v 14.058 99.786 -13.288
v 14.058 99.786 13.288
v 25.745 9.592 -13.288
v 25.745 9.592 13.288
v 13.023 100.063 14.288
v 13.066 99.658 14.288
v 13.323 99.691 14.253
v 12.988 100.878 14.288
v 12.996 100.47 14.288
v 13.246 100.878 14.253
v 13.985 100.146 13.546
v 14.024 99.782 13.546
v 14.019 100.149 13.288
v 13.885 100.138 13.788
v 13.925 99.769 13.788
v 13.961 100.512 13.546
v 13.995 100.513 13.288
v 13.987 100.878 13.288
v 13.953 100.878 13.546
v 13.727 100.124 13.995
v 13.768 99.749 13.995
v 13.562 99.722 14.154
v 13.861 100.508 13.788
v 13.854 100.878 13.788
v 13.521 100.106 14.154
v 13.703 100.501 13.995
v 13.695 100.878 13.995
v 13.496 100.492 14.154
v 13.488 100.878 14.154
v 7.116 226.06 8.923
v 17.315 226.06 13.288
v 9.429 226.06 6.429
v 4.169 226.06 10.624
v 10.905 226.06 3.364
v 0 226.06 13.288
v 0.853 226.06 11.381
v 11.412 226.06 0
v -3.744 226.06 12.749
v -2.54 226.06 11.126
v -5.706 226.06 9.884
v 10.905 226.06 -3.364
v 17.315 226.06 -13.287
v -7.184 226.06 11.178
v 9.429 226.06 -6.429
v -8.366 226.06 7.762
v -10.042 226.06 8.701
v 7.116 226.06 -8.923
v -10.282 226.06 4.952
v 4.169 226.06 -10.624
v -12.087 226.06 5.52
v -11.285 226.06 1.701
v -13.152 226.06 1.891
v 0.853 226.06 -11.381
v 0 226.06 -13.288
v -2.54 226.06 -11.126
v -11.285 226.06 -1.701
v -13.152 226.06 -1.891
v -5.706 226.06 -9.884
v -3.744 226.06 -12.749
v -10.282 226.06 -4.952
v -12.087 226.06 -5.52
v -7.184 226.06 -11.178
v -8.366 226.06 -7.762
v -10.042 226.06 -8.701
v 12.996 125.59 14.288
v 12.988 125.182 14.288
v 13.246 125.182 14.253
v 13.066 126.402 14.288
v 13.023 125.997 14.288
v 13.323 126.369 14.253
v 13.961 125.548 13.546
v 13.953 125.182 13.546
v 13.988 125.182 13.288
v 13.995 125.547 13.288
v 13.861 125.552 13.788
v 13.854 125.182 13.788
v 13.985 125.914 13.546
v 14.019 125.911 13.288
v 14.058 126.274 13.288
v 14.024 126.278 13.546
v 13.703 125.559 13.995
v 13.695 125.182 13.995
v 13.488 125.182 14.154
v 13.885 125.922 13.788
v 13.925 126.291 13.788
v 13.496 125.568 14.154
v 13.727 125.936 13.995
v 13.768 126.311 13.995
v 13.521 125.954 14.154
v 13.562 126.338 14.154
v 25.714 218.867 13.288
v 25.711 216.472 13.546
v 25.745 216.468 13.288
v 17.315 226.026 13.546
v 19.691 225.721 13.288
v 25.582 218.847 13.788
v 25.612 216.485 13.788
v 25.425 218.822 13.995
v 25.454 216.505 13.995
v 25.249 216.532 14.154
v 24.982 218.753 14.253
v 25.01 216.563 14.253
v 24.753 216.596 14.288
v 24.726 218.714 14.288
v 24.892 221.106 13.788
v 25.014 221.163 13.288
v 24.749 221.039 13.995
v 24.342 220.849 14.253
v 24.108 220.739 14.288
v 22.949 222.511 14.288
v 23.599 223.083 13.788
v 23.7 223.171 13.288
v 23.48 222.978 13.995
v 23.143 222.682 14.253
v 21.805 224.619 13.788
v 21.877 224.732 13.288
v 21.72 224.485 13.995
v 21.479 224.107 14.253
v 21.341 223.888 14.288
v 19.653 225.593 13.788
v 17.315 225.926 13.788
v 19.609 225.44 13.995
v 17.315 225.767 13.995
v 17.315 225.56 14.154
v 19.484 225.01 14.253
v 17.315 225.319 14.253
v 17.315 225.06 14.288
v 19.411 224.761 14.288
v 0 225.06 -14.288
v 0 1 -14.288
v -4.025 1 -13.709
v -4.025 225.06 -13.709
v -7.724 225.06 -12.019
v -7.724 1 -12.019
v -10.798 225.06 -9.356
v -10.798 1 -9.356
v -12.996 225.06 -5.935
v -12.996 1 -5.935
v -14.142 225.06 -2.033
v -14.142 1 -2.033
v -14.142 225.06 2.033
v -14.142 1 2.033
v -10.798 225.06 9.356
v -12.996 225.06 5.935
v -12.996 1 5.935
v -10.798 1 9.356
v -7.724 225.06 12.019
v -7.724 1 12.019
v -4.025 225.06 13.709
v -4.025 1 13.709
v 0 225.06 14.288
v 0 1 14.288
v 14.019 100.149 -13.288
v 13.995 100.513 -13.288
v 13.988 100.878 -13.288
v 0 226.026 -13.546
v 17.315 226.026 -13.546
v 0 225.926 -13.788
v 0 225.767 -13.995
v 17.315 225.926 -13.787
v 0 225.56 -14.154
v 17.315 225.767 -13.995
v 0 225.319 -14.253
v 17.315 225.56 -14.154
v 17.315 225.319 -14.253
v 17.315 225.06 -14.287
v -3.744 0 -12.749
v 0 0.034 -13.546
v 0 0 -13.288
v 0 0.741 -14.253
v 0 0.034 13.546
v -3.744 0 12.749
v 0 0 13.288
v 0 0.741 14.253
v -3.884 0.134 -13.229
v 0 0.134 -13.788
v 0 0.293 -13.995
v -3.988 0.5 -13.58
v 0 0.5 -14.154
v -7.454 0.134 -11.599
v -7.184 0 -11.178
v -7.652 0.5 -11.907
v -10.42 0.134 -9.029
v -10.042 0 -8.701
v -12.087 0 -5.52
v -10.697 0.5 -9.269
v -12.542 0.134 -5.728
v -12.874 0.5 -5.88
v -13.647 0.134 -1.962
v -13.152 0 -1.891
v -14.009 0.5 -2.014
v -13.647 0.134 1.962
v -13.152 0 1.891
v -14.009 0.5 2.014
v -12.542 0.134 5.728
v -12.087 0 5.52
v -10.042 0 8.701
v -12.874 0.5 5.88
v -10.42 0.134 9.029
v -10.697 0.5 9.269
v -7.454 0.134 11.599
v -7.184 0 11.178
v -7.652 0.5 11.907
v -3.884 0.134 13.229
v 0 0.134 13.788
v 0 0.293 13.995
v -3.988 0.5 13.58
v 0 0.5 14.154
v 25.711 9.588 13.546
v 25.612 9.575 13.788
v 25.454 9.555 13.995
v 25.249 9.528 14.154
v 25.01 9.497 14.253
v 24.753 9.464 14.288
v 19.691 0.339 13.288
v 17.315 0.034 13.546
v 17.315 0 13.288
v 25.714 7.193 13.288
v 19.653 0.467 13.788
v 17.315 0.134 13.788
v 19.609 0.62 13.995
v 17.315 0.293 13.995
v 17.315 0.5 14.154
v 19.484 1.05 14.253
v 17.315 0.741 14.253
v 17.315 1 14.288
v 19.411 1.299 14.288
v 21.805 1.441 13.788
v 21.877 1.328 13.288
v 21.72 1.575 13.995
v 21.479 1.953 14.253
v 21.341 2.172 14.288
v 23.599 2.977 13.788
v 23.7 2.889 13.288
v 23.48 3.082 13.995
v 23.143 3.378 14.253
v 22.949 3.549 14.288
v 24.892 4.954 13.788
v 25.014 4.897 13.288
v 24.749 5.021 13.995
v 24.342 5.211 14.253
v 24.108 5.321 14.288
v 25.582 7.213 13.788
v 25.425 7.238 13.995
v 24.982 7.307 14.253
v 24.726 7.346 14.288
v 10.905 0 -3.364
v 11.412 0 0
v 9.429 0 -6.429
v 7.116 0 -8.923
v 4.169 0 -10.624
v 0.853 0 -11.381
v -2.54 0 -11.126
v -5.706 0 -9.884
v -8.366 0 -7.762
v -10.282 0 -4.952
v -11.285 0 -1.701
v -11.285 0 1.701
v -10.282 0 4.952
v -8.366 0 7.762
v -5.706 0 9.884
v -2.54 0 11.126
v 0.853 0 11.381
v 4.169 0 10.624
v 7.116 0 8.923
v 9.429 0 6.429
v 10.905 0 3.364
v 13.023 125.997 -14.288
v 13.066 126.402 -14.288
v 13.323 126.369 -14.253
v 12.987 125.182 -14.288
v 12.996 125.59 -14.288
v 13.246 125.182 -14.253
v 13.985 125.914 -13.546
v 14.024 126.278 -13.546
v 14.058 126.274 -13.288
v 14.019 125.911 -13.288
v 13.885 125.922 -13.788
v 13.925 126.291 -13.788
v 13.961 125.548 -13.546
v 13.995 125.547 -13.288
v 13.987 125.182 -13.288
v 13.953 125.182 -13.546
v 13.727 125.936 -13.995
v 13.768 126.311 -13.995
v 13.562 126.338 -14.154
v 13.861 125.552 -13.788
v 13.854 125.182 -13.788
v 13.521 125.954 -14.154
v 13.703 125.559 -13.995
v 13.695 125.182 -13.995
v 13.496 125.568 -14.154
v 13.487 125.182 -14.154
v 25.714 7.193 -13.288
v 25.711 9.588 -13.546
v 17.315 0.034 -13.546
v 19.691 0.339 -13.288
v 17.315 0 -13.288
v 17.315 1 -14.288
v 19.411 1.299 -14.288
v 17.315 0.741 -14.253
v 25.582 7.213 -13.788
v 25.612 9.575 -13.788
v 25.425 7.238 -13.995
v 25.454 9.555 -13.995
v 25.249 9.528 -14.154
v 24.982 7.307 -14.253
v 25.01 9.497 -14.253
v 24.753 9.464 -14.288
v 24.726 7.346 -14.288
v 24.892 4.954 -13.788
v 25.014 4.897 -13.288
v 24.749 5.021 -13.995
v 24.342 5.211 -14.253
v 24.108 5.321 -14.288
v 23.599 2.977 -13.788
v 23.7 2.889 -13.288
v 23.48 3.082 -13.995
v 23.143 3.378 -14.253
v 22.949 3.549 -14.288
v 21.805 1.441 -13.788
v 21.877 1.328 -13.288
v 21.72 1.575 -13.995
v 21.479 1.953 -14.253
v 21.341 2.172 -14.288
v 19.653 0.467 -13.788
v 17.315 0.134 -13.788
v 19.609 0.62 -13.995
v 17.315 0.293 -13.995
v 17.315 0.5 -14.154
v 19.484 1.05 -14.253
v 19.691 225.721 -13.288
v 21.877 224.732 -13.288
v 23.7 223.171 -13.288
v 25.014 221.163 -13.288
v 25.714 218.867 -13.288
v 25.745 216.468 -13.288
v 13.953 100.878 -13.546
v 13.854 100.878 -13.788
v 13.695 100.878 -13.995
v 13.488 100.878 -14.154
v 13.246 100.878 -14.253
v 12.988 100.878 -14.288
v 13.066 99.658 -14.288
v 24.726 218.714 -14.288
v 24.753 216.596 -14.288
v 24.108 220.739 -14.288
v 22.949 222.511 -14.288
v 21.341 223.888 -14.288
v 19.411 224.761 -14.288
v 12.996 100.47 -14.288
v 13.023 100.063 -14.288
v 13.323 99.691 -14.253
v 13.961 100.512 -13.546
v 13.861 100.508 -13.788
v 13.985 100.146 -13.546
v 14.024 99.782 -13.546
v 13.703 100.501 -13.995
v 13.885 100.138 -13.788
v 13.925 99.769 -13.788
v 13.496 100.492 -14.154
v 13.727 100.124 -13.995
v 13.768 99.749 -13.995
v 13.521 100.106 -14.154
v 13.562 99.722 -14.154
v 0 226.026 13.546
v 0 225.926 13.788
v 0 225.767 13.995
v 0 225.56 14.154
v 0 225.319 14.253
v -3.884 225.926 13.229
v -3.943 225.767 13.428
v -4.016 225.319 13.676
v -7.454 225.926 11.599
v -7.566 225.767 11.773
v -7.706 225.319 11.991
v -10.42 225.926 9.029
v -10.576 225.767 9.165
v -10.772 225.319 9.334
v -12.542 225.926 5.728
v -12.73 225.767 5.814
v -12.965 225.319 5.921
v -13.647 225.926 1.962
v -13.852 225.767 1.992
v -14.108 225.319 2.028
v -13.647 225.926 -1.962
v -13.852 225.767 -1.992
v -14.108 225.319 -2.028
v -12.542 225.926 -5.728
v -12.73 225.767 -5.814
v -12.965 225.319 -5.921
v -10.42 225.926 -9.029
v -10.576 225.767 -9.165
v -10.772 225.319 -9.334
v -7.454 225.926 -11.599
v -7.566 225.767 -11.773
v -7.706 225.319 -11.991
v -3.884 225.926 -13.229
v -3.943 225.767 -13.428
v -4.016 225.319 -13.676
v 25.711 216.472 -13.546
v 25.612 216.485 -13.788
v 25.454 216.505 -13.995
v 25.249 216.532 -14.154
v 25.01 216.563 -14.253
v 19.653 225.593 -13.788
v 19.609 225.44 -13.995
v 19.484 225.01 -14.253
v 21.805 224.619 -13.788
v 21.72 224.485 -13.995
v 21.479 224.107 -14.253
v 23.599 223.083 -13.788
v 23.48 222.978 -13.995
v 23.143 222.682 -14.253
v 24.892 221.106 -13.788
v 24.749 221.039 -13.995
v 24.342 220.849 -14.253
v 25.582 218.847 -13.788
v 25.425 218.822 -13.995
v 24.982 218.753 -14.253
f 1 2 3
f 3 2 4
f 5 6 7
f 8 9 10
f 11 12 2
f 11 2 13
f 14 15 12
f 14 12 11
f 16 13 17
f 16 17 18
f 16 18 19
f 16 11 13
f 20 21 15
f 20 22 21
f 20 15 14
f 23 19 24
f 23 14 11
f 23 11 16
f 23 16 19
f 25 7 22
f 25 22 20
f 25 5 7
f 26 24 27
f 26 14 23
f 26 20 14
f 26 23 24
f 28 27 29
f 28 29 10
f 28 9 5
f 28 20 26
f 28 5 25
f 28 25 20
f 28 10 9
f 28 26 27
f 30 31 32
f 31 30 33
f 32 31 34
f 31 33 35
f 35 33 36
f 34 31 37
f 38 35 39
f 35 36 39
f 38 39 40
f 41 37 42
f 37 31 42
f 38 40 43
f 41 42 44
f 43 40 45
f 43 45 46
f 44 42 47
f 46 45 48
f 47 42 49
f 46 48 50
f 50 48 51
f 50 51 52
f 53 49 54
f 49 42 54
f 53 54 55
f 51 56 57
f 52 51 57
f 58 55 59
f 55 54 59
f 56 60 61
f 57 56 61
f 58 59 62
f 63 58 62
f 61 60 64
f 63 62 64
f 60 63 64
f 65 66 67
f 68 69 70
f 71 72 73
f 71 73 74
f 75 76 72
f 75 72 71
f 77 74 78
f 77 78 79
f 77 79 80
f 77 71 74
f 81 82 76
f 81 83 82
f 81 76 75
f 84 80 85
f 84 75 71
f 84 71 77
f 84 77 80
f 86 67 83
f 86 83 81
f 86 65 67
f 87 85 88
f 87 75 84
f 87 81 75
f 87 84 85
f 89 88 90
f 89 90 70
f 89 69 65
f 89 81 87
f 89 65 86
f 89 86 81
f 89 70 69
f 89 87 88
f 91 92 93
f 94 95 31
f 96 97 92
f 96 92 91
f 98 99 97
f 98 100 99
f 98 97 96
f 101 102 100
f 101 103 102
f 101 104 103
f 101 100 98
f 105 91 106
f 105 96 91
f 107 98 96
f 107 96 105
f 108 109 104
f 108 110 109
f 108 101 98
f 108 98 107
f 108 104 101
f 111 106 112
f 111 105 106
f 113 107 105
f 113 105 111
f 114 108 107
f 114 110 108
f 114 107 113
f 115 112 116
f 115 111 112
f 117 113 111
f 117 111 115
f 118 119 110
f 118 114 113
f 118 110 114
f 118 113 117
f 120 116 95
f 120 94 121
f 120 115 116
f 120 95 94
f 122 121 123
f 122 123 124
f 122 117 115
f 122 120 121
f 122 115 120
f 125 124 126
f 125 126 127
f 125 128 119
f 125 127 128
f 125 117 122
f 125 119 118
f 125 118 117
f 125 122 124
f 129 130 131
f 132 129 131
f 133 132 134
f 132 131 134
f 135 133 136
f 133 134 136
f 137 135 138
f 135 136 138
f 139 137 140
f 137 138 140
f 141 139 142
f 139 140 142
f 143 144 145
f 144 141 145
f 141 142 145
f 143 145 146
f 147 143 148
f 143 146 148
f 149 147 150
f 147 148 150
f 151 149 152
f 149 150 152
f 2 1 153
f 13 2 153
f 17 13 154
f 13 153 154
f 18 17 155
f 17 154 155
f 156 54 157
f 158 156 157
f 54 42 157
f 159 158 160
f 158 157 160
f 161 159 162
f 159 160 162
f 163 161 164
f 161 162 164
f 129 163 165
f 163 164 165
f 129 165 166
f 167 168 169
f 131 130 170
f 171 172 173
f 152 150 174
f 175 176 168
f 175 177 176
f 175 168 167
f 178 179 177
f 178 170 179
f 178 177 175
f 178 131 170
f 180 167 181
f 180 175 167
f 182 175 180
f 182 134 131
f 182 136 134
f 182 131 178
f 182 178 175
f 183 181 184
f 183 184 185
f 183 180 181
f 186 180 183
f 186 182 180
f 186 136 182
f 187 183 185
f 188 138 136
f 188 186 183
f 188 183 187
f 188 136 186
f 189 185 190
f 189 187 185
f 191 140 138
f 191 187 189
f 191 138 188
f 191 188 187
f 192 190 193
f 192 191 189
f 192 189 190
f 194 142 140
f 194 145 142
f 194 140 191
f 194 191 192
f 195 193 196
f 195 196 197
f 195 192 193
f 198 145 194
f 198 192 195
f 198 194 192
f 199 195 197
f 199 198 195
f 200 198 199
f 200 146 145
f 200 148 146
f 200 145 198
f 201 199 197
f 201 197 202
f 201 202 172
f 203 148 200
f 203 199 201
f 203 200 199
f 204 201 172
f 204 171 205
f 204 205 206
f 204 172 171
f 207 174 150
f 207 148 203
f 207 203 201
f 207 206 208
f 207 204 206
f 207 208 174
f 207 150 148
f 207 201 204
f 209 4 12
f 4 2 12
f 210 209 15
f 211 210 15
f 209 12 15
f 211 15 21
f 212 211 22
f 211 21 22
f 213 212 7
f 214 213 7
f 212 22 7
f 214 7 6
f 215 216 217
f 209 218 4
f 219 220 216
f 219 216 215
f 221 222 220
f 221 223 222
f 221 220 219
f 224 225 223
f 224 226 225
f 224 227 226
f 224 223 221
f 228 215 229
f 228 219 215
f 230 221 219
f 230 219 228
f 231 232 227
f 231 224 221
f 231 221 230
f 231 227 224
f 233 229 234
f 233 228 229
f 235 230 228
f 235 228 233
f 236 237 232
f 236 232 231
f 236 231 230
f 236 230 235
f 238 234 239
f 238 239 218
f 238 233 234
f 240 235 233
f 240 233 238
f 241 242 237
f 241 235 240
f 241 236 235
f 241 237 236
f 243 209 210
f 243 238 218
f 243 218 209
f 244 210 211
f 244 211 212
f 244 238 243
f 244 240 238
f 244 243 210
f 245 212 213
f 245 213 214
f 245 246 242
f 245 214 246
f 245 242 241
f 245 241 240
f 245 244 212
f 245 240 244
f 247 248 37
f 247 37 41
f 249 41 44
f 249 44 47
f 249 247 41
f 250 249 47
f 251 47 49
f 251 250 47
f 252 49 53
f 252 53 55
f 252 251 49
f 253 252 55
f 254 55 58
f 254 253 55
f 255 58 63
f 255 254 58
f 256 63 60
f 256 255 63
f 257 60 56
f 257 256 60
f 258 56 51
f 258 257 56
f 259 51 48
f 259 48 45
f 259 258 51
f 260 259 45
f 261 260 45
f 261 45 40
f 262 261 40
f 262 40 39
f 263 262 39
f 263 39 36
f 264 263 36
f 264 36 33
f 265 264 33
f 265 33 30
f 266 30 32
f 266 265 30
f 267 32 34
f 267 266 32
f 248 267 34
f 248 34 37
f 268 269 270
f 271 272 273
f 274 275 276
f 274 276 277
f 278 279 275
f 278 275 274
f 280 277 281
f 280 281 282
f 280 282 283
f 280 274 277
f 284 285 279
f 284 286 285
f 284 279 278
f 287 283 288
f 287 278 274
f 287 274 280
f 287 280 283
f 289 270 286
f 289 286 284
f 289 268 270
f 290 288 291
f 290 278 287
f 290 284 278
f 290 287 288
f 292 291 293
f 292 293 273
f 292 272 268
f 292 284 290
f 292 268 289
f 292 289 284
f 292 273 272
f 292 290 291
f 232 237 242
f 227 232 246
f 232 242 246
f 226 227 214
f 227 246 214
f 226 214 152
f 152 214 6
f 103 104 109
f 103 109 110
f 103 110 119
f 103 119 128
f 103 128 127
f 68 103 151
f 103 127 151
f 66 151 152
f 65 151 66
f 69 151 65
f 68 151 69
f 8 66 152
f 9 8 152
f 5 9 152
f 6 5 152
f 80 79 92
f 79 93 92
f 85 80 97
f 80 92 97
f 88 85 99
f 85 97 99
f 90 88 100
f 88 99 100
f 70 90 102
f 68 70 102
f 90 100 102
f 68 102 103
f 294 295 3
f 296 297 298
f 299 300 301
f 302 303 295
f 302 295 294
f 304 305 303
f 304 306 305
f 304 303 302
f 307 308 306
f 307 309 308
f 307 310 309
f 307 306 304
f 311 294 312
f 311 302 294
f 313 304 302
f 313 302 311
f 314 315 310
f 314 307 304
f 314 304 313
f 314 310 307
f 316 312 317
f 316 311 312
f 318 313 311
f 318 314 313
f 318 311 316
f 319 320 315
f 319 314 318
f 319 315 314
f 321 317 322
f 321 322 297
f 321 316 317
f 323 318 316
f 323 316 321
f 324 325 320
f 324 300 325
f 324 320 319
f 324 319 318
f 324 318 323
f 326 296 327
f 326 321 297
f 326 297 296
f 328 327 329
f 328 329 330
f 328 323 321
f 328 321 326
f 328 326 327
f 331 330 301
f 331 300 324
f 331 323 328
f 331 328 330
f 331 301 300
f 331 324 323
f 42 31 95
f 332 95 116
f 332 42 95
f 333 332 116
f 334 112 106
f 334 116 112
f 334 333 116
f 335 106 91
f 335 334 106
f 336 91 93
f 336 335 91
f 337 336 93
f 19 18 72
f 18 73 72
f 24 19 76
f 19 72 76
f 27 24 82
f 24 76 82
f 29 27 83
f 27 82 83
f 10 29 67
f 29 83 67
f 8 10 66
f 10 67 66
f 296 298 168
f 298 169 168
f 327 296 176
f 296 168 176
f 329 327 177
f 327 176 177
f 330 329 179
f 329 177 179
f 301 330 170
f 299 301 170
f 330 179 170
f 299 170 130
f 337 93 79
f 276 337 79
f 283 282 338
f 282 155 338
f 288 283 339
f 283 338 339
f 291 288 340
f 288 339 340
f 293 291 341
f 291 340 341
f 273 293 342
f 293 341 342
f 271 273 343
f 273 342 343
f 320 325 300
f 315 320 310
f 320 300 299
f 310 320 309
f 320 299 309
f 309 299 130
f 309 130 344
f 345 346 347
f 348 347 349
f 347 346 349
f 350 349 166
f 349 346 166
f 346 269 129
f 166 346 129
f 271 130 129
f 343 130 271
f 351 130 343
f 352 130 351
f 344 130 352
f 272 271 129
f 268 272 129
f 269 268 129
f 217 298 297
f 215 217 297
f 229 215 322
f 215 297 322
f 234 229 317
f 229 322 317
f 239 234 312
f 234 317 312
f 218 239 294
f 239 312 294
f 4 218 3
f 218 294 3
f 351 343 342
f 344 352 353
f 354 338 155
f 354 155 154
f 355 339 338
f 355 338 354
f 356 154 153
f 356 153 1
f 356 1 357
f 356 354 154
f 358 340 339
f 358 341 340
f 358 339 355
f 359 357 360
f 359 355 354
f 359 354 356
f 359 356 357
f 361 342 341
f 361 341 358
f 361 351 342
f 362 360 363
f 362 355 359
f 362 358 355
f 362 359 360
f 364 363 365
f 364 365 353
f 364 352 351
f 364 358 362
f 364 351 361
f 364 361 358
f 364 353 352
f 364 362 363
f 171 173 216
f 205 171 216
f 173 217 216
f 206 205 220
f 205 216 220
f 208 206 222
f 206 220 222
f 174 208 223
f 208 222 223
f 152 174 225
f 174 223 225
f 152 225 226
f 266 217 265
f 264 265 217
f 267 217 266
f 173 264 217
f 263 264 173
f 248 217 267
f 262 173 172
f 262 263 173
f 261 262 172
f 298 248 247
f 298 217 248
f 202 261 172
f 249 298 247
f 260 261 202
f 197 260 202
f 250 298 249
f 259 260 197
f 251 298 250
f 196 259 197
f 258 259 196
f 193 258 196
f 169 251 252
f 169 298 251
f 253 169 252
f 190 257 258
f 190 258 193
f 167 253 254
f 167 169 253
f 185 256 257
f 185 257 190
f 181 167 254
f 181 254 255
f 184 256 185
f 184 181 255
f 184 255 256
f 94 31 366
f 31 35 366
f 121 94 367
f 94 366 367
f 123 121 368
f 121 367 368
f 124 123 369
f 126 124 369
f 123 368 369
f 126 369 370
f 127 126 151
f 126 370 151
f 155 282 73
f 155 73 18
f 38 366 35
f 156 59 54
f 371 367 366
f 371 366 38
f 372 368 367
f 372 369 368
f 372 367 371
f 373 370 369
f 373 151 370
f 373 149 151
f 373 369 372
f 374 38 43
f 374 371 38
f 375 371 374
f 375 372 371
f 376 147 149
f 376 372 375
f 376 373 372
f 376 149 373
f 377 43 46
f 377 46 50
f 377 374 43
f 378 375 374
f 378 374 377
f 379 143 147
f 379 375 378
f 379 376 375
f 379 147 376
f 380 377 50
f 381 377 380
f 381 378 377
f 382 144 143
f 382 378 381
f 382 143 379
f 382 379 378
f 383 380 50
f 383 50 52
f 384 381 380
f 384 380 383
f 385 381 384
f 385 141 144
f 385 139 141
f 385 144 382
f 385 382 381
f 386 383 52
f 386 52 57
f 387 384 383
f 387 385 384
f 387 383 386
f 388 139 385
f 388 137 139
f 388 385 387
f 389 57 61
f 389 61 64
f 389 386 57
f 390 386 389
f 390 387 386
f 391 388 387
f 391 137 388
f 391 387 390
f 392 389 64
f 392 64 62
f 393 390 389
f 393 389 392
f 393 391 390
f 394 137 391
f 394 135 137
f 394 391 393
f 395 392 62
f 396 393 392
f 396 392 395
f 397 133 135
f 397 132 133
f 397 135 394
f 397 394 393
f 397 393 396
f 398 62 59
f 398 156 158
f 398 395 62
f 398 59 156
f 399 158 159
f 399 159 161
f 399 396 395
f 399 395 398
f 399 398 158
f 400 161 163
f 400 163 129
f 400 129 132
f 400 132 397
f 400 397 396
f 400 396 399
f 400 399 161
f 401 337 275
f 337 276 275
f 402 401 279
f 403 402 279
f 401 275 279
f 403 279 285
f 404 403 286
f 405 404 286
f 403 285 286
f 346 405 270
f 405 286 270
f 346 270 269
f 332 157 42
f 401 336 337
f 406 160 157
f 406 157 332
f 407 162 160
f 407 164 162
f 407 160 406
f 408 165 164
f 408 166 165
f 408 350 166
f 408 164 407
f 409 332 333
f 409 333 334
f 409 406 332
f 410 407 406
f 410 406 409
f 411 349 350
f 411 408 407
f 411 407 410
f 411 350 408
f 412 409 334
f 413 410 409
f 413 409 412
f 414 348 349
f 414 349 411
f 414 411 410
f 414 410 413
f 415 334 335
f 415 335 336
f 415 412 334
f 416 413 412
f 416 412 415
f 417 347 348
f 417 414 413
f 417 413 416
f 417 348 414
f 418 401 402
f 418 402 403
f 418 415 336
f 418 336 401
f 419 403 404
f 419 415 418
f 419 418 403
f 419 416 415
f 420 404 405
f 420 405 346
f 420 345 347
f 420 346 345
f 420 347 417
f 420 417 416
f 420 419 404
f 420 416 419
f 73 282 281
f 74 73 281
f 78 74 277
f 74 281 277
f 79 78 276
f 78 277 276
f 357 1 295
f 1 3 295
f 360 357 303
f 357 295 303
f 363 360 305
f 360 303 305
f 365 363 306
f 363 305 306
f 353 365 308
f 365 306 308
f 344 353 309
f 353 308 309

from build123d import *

# Parameters (mm, degrees)
SKETCH1_R           = 14.2875
SKETCH1_R_2         = 11.4125
BOSS_EXTRUDE1_DEPTH = 226.06
SKETCH2_W           = 28.575
SKETCH2_H           = 226.06
BOSS_EXTRUDE2_DEPTH = 12.7
BOSS_EXTRUDE3_DEPTH = 226.06
CUT_EXTRUDE1_DEPTH  = 29.575
FILLET1_R           = 8.5
FILLET2_R           = 8.5
FILLET3_R           = 1


with BuildPart() as part:
    # Sketch1 → Boss-Extrude1 (new body)
    with BuildSketch(Plane(origin=(0, 0, 0), x_dir=(1, 0, 0), z_dir=(0, 1, 0))):
        Circle(SKETCH1_R)
        Circle(SKETCH1_R_2, mode=Mode.SUBTRACT)
    extrude(amount=BOSS_EXTRUDE1_DEPTH)



with BuildPart() as body_2:
    # Sketch2 → Boss-Extrude2 (new body)
    with BuildSketch(Plane(origin=(14.2875, 0, 0), x_dir=(0, 0, -1), z_dir=(1, 0, 0))):
        with Locations((0, 113.03)):
            Rectangle(SKETCH2_W, SKETCH2_H)
    extrude(amount=BOSS_EXTRUDE2_DEPTH)


with BuildPart() as part_1:
    add(part.part)

    add(body_2.part)  # Boss-Extrude3 merges body 2
    # Sketch3 → Boss-Extrude3 (add, through all)
    with BuildSketch(Plane(origin=(0, 226.06, 0), x_dir=(1, 0, 0), z_dir=(0, 1, 0))):
        with BuildLine():
            Line((14.2875, -14.2875), (0, -14.2875))
            ThreePointArc((0, -14.2875), (14.2875, 0), (0, 14.2875))
            Line((0, 14.2875), (14.2875, 14.2875))
            Line((14.2875, 14.2875), (26.9875, 14.2875))
            Line((26.9875, 14.2875), (26.9875, -14.2875))
            Line((26.9875, -14.2875), (14.2875, -14.2875))
        make_face()
    extrude(amount=-BOSS_EXTRUDE3_DEPTH)

    # Sketch5 → Cut-Extrude1 (cut, through all)
    with BuildSketch(Plane.XY.offset(14.2875)):
        Polygon((26.9875, 226.06), (13.9875, 125.73), (13.9875, 100.33), (26.9875, 0), align=None)
    extrude(amount=-CUT_EXTRUDE1_DEPTH, mode=Mode.SUBTRACT)

    # Fillet1
    fillet1_edges = [part_1.edges().sort_by_distance(p)[0] for p in [
        (26.9875, 0, 0),
        (26.9875, 226.06, 0),
    ]]
    fillet(fillet1_edges, radius=FILLET1_R)

    # Fillet2
    fillet2_edges = [part_1.edges().sort_by_distance(p)[0] for p in [
        (13.9875, 125.73, 0),
        (13.9875, 100.33, 0),
    ]]
    fillet(fillet2_edges, radius=FILLET2_R)

    # Fillet3
    fillet3_edges = [part_1.edges().sort_by_distance(p)[0] for p in [
        (-14.2875, 0, 0),
        (8.657539107, 0, 14.2875),
        (8.657539107, 226.06, 14.2875),
        (19.901289107, 171.370804703, -14.2875),
        (8.657539107, 0, -14.2875),
        (8.657539107, 226.06, -14.2875),
        (23.69998215, 223.17097155, -14.2875),
        (23.69998215, 2.88902845, -14.2875),
        (19.901289107, 171.370804703, 14.2875),
        (23.69998215, 223.17097155, 14.2875),
        (23.69998215, 2.88902845, 14.2875),
        (19.901289107, 54.689195297, 14.2875),
        (19.901289107, 54.689195297, -14.2875),
        (13.9875, 113.03, 14.2875),
        (13.9875, 113.03, -14.2875),
        (14.005135098, 100.331137756, 14.2875),
        (14.005135098, 100.331137756, -14.2875),
        (14.005135098, 125.728862244, 14.2875),
        (14.005135098, 125.728862244, -14.2875),
        (-14.2875, 226.06, 0),
    ]]
    fillet(fillet3_edges, radius=FILLET3_R)


solid = part_1.part
